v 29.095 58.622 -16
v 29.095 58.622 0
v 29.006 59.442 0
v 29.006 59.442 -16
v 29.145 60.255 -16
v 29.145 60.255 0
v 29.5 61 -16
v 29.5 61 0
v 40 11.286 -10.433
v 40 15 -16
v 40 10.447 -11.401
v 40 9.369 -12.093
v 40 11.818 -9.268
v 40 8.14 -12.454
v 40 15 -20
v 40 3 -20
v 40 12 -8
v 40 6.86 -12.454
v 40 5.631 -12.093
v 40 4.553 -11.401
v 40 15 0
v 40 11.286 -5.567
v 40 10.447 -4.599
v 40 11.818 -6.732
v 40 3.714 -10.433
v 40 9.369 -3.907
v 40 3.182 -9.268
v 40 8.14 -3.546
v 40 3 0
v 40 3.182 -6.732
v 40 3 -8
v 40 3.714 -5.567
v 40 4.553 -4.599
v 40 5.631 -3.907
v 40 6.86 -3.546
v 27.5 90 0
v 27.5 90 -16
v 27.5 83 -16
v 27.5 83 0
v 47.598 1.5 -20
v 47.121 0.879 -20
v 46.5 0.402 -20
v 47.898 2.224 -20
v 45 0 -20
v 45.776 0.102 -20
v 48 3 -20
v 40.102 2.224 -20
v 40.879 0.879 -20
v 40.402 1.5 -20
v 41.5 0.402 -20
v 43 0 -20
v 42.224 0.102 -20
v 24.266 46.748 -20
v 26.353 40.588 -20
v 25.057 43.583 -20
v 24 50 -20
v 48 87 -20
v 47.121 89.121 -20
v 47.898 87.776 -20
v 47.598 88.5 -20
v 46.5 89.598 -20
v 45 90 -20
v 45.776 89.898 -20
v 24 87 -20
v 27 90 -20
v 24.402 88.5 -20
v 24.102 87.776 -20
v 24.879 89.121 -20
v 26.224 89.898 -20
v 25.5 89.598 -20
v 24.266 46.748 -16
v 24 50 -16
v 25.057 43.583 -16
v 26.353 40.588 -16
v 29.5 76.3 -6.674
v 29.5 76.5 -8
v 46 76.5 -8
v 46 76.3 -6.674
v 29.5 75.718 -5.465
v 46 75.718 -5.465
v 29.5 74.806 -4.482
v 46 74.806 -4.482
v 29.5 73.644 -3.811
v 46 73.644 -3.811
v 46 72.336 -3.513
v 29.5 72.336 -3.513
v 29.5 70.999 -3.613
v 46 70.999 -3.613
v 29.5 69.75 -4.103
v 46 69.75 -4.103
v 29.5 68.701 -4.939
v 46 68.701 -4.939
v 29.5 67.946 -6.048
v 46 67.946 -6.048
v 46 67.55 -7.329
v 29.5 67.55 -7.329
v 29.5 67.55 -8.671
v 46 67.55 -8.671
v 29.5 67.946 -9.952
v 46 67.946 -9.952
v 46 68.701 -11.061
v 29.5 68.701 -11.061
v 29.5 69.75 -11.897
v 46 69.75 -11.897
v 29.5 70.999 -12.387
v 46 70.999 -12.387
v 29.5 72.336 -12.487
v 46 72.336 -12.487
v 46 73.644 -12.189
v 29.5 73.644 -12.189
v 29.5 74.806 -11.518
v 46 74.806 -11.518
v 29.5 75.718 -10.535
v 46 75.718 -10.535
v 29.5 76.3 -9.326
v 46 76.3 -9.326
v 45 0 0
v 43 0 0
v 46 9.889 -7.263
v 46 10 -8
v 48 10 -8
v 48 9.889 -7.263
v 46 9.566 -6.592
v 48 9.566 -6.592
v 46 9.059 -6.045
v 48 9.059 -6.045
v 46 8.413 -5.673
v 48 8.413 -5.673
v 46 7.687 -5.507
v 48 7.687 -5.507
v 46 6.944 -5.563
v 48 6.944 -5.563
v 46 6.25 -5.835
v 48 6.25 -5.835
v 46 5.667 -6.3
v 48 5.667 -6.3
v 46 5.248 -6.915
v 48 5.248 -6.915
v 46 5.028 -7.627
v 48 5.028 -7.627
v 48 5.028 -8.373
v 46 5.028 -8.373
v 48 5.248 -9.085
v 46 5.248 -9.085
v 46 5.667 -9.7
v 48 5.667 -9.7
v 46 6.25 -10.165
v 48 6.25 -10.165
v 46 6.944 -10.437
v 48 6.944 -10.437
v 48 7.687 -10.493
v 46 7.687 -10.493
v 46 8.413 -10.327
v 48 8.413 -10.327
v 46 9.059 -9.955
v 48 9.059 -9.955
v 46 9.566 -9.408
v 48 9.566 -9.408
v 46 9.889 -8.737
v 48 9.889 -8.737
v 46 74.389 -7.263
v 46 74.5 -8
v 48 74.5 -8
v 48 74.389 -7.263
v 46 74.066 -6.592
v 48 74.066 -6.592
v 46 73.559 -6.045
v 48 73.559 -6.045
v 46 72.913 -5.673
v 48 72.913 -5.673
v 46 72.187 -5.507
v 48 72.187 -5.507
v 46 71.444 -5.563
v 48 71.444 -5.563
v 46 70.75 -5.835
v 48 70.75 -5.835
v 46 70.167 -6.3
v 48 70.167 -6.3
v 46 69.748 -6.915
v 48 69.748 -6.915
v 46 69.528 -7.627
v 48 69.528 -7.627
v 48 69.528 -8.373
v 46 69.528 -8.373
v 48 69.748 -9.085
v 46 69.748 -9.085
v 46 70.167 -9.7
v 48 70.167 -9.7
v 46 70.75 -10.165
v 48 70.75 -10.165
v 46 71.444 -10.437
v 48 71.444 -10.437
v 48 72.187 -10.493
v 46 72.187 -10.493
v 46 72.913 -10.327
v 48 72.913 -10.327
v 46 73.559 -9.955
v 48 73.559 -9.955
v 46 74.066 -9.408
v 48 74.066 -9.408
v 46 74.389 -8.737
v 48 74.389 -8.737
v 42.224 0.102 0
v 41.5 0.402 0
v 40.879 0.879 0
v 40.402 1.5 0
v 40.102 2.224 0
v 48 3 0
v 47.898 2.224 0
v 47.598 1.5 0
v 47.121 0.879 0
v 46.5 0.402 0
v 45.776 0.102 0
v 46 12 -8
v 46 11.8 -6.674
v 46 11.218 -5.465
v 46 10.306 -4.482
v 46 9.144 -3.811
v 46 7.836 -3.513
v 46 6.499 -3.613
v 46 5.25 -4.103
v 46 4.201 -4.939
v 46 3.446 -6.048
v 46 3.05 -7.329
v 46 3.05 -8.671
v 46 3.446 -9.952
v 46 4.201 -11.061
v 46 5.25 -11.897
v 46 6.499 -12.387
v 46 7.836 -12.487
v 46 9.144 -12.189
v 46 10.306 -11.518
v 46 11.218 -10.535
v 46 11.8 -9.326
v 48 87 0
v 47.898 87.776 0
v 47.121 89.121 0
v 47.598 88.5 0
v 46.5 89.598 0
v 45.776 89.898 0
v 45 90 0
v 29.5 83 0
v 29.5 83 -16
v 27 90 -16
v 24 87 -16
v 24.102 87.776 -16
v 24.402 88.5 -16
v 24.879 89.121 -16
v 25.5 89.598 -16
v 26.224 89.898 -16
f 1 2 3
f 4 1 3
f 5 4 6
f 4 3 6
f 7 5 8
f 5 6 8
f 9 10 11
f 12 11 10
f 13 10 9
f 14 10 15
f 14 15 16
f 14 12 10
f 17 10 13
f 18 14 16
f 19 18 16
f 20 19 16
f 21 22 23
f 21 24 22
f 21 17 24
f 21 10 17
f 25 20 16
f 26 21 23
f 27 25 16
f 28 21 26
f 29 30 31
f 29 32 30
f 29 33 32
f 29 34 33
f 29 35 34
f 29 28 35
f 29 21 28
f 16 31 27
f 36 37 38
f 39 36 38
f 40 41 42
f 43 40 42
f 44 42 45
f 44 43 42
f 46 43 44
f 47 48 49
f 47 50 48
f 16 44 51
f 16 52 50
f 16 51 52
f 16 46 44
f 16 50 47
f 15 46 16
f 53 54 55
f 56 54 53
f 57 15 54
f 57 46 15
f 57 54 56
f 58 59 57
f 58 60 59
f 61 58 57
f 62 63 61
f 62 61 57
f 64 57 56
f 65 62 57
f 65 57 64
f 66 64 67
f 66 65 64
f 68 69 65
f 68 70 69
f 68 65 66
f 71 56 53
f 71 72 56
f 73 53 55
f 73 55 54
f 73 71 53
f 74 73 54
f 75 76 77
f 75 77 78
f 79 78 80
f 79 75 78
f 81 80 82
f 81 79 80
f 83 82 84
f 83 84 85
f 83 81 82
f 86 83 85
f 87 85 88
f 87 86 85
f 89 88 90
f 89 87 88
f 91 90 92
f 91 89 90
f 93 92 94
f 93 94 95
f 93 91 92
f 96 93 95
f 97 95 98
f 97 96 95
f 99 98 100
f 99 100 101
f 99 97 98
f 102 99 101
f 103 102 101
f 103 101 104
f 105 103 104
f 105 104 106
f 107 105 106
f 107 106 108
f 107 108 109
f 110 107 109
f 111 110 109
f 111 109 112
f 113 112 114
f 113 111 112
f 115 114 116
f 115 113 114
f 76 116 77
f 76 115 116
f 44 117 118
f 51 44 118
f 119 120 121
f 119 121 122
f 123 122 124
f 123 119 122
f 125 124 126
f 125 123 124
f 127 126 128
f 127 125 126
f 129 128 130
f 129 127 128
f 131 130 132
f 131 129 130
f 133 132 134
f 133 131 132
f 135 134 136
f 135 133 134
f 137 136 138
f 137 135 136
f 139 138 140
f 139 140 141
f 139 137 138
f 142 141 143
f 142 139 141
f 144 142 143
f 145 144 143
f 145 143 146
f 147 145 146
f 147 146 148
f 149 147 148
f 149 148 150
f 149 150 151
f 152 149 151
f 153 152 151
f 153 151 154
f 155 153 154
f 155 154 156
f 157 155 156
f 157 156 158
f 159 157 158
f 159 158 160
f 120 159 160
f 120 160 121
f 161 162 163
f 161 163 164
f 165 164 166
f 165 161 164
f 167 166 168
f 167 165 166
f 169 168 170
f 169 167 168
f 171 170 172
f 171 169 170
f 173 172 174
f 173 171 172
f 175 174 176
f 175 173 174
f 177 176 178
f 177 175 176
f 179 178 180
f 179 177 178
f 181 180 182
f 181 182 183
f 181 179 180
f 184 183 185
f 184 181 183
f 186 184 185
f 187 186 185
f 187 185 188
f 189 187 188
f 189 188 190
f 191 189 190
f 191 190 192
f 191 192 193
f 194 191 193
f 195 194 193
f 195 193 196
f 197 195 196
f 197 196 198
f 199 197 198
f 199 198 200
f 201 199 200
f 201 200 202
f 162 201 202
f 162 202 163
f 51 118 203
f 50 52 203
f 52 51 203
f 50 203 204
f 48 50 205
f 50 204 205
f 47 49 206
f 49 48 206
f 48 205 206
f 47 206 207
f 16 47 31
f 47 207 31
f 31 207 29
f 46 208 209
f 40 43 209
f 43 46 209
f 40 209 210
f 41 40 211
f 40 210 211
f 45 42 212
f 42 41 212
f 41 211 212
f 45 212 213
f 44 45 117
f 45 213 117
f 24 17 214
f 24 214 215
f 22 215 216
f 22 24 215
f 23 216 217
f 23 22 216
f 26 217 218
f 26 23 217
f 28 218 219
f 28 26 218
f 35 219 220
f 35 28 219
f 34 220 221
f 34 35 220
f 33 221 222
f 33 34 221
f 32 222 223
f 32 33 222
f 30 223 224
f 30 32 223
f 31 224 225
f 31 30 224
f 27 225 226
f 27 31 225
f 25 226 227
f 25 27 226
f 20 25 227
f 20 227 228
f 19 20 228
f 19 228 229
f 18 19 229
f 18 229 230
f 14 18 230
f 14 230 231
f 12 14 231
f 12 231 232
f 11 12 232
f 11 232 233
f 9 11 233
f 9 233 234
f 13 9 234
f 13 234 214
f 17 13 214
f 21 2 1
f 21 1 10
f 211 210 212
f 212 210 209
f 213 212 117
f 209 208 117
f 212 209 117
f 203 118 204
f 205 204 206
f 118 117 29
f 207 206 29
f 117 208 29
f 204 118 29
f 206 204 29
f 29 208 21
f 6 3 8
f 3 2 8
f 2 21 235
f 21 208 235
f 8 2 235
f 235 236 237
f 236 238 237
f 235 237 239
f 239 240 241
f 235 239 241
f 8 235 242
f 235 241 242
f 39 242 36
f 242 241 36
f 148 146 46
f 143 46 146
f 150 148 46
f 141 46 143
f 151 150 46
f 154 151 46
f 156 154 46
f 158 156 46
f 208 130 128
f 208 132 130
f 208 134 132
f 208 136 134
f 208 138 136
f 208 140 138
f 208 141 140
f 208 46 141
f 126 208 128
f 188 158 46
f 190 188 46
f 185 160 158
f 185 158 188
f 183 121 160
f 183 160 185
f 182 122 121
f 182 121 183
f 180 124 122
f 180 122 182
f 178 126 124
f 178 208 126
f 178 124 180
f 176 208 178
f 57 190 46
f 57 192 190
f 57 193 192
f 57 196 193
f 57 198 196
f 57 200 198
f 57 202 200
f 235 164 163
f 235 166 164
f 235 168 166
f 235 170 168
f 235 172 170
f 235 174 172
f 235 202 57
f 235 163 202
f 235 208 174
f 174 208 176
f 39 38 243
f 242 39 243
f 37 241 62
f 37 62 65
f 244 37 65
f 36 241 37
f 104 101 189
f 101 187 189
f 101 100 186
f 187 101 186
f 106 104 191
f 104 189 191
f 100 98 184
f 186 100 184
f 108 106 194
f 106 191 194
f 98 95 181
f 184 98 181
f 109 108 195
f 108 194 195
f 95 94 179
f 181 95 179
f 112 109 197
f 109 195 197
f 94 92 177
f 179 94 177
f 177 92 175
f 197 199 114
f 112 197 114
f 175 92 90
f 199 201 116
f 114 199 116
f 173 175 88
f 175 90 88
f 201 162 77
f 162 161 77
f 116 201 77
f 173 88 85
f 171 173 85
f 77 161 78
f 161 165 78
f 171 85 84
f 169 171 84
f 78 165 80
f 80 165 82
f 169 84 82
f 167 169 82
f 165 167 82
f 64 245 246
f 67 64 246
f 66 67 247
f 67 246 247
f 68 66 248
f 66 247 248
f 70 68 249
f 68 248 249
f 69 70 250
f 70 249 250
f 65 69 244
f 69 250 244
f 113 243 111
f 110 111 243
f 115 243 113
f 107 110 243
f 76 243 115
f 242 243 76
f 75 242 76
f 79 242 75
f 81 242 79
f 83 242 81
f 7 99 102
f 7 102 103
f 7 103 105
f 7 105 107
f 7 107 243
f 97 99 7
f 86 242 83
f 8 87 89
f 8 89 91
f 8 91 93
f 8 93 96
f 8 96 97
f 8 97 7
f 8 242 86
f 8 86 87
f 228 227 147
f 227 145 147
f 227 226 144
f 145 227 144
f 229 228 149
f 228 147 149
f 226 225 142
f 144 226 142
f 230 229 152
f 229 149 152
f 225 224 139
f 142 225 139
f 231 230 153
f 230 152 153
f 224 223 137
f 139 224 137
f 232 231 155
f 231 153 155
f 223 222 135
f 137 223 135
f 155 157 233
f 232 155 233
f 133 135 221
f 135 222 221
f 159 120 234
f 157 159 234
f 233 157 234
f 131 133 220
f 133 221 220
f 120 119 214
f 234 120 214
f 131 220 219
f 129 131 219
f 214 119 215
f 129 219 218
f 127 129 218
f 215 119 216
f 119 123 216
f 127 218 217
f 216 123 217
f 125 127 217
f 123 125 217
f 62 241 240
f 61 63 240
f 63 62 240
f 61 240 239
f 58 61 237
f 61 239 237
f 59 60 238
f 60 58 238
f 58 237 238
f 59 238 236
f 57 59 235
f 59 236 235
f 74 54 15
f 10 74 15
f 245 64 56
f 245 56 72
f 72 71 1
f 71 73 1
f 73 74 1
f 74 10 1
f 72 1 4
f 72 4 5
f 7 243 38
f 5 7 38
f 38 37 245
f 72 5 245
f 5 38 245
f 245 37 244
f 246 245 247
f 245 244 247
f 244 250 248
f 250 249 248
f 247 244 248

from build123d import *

# Parameters (mm, degrees)
SKETCH1_W            = 24
SKETCH1_H            = 90
BOSS_EXTRUDE1_DEPTH  = 20
CUT_EXTRUDE1_DEPTH   = 16
CUT_EXTRUDE8_DEPTH   = 10
SKETCH11_R           = 2.5
CUT_EXTRUDE9_DEPTH   = 18.5
SKETCH12_R           = 4.5
CUT_EXTRUDE10_DEPTH  = 16.5
FILLET1_R            = 20
FILLET2_R            = 3
FILLET1_OF_MIRROR1_R = 20
FILLET2_OF_MIRROR1_R = 3
SKETCH13_W           = 28.58864277
SKETCH13_H           = 106.823904202
CUT_EXTRUDE11_DEPTH  = 24


with BuildPart() as part:
    # Sketch1 → Boss-Extrude1 (new body)
    with BuildSketch(Plane.XY):
        with Locations((12, 45)):
            Rectangle(SKETCH1_W, SKETCH1_H)
    boss_extrude1 = extrude(amount=-BOSS_EXTRUDE1_DEPTH)

    # Sketch4 → Cut-Extrude1 (cut)
    with BuildSketch(Plane.XY):
        Polygon((20.5, 83), (18.5, 83), (18.5, 61), (19.5, 61), (8, 15), (8, 0), (24, 0), (24, 90), (20.5, 90), align=None)
    cut_extrude1 = extrude(amount=-CUT_EXTRUDE1_DEPTH, mode=Mode.SUBTRACT)

    # Sketch9 → Cut-Extrude8 (cut)
    with BuildSketch(Plane(origin=(0, 0, -20), x_dir=(-1, 0, 0), z_dir=(0, 0, -1))):
        Polygon((-24, 0), (-24, 45), (-8, 15), (-8, 0), align=None)
    cut_extrude8 = extrude(amount=-CUT_EXTRUDE8_DEPTH, mode=Mode.SUBTRACT)

    # Sketch11 → Cut-Extrude9 (cut)
    with BuildSketch(Plane(origin=(18.5, 0, 0), x_dir=(0, 0, -1), z_dir=(1, 0, 0))):
        with Locations(Location((8, 72, 0), (0, 0, 90))):
            Circle(SKETCH11_R)
        with Locations(Location((8, 7.5, 0), (0, 0, 90))):
            Circle(SKETCH11_R)
    cut_extrude9 = extrude(amount=-CUT_EXTRUDE9_DEPTH, mode=Mode.SUBTRACT)

    # Sketch12 → Cut-Extrude10 (cut)
    with BuildSketch(Plane(origin=(18.5, 0, 0), x_dir=(0, 0, -1), z_dir=(1, 0, 0))):
        with Locations(Location((8, 72, 0), (0, 0, 90))):
            Circle(SKETCH12_R)
        with Locations(Location((8, 7.5, 0), (0, 0, 90))):
            Circle(SKETCH12_R)
    cut_extrude10 = extrude(amount=-CUT_EXTRUDE10_DEPTH, mode=Mode.SUBTRACT)

    # Fillet1
    fillet1_edges = [part.edges().sort_by_distance(p)[0] for p in [
        (24, 45, -18),
    ]]
    fillet(fillet1_edges, radius=FILLET1_R)

    # Fillet2
    # the kernel refuses this fillet: 3 mm, written as the material it takes off along each edge
    with BuildSketch(Plane(origin=(0, 90, 7.5), x_dir=(1, 0, 0), z_dir=(0, 0, -1)), Plane(origin=(0, 0, 7.5), x_dir=(0, 1, 0), z_dir=(0, 0, -1)), Plane(origin=(8, 0, -27.5), x_dir=(0, 1, 0), z_dir=(0, 0, 1))) as fillet2_piece_1:
        with BuildLine():
            CenterArc((FILLET2_R, FILLET2_R), FILLET2_R, 180, 90)
            Line((0, FILLET2_R), (-FILLET2_R * 0.02, FILLET2_R))
            Line((-FILLET2_R * 0.02, FILLET2_R), (-FILLET2_R * 0.02, -FILLET2_R * 0.02))
            Line((-FILLET2_R * 0.02, -FILLET2_R * 0.02), (FILLET2_R, -FILLET2_R * 0.02))
            Line((FILLET2_R, -FILLET2_R * 0.02), (FILLET2_R, 0))
        make_face()
    extrude(amount=35, mode=Mode.SUBTRACT)
    with BuildSketch(Plane(origin=(24, 90, -8.5), x_dir=(0, -1, 0), z_dir=(0, 0, -1))) as fillet2_piece_2:
        with BuildLine():
            CenterArc((FILLET2_R, FILLET2_R), FILLET2_R, 180, 90)
            Line((0, FILLET2_R), (-FILLET2_R * 0.02, FILLET2_R))
            Line((-FILLET2_R * 0.02, FILLET2_R), (-FILLET2_R * 0.02, -FILLET2_R * 0.02))
            Line((-FILLET2_R * 0.02, -FILLET2_R * 0.02), (FILLET2_R, -FILLET2_R * 0.02))
            Line((FILLET2_R, -FILLET2_R * 0.02), (FILLET2_R, 0))
        make_face()
    extrude(amount=19, mode=Mode.SUBTRACT)
    with BuildSketch(Plane(origin=(19.5, 61, 6.128837665), x_dir=(-0.24253562503633366, -0.9701425001453317, 0), z_dir=(0, 0, -1))) as fillet2_piece_3:
        with BuildLine():
            CenterArc((2.451535066, 3), FILLET2_R, 222.580014358, 47.419985642)
            Line((0.242535625, 0.9701425), (0.198355636, 0.92954535))
            ThreePointArc((0.198355636, 0.92954535), (0.063059263, 0.499623388), (-0.05820855, 0.014552138))
            Line((-0.05820855, 0.014552138), (0, -0.06))
            Line((0, -0.06), (2.451535066, -0.06))
            Line((2.451535066, -0.06), (2.451535066, 0))
        make_face()
    extrude(amount=22.128837665, mode=Mode.SUBTRACT)


with BuildPart() as mirror1_1:
    # Mirror1: Boss-Extrude1 across plane
    add(boss_extrude1.mirror(Plane(origin=(24, 0, -20), x_dir=(0, 0, 1), z_dir=(1, 0, 0))))

    # Mirror1 2: Cut-Extrude1, Cut-Extrude8, Cut-Extrude9, Cut-Extrude10 across plane
    add(cut_extrude1.mirror(Plane(origin=(24, 0, -20), x_dir=(0, 0, 1), z_dir=(1, 0, 0))), mode=Mode.SUBTRACT)
    add(cut_extrude8.mirror(Plane(origin=(24, 0, -20), x_dir=(0, 0, 1), z_dir=(1, 0, 0))), mode=Mode.SUBTRACT)
    add(cut_extrude9.mirror(Plane(origin=(24, 0, -20), x_dir=(0, 0, 1), z_dir=(1, 0, 0))), mode=Mode.SUBTRACT)
    add(cut_extrude10.mirror(Plane(origin=(24, 0, -20), x_dir=(0, 0, 1), z_dir=(1, 0, 0))), mode=Mode.SUBTRACT)

    # Fillet1 of Mirror1
    fillet1_of_mirror1_edges = [mirror1_1.edges().sort_by_distance(p)[0] for p in [
        (24, 45, -18),
    ]]
    fillet(fillet1_of_mirror1_edges, radius=FILLET1_OF_MIRROR1_R)

    # Fillet2 of Mirror1
    # the kernel refuses this fillet: 3 mm, written as the material it takes off along each edge
    with BuildSketch(Plane(origin=(48, 90, 7.5), x_dir=(-1, 0, 0), z_dir=(0, 0, -1)), Plane(origin=(48, 0, 7.5), x_dir=(0, 1, 0), z_dir=(0, 0, -1))) as fillet2_of_mirror1_piece_1:
        with BuildLine():
            CenterArc((FILLET2_OF_MIRROR1_R, -FILLET2_OF_MIRROR1_R), FILLET2_OF_MIRROR1_R, 90, 90)
            Line((0, -FILLET2_OF_MIRROR1_R), (-FILLET2_OF_MIRROR1_R * 0.02, -FILLET2_OF_MIRROR1_R))
            Line((-FILLET2_OF_MIRROR1_R * 0.02, -FILLET2_OF_MIRROR1_R), (-FILLET2_OF_MIRROR1_R * 0.02, FILLET2_OF_MIRROR1_R * 0.02))
            Line((-FILLET2_OF_MIRROR1_R * 0.02, FILLET2_OF_MIRROR1_R * 0.02), (FILLET2_OF_MIRROR1_R, FILLET2_OF_MIRROR1_R * 0.02))
            Line((FILLET2_OF_MIRROR1_R, FILLET2_OF_MIRROR1_R * 0.02), (FILLET2_OF_MIRROR1_R, 0))
        make_face()
    extrude(amount=35, mode=Mode.SUBTRACT)
    with BuildSketch(Plane(origin=(24, 90, -8.5), x_dir=(0, -1, 0), z_dir=(0, 0, -1))) as fillet2_of_mirror1_piece_2:
        with BuildLine():
            CenterArc((FILLET2_OF_MIRROR1_R, -FILLET2_OF_MIRROR1_R), FILLET2_OF_MIRROR1_R, 90, 90)
            Line((0, -FILLET2_OF_MIRROR1_R), (-FILLET2_OF_MIRROR1_R * 0.02, -FILLET2_OF_MIRROR1_R))
            Line((-FILLET2_OF_MIRROR1_R * 0.02, -FILLET2_OF_MIRROR1_R), (-FILLET2_OF_MIRROR1_R * 0.02, FILLET2_OF_MIRROR1_R * 0.02))
            Line((-FILLET2_OF_MIRROR1_R * 0.02, FILLET2_OF_MIRROR1_R * 0.02), (FILLET2_OF_MIRROR1_R, FILLET2_OF_MIRROR1_R * 0.02))
            Line((FILLET2_OF_MIRROR1_R, FILLET2_OF_MIRROR1_R * 0.02), (FILLET2_OF_MIRROR1_R, 0))
        make_face()
    extrude(amount=19, mode=Mode.SUBTRACT)
    with BuildSketch(Plane(origin=(40, 0, 7.5), x_dir=(0, 1, 0), z_dir=(0, 0, -1))) as fillet2_of_mirror1_piece_3:
        with BuildLine():
            CenterArc((FILLET2_OF_MIRROR1_R, FILLET2_OF_MIRROR1_R), FILLET2_OF_MIRROR1_R, 180, 90)
            Line((0, FILLET2_OF_MIRROR1_R), (-FILLET2_OF_MIRROR1_R * 0.02, FILLET2_OF_MIRROR1_R))
            Line((-FILLET2_OF_MIRROR1_R * 0.02, FILLET2_OF_MIRROR1_R), (-FILLET2_OF_MIRROR1_R * 0.02, -FILLET2_OF_MIRROR1_R * 0.02))
            Line((-FILLET2_OF_MIRROR1_R * 0.02, -FILLET2_OF_MIRROR1_R * 0.02), (FILLET2_OF_MIRROR1_R, -FILLET2_OF_MIRROR1_R * 0.02))
            Line((FILLET2_OF_MIRROR1_R, -FILLET2_OF_MIRROR1_R * 0.02), (FILLET2_OF_MIRROR1_R, 0))
        make_face()
    extrude(amount=35, mode=Mode.SUBTRACT)
    with BuildSketch(Plane(origin=(28.5, 61, 6.128837665), x_dir=(0.24253562503633366, -0.9701425001453317, 0), z_dir=(0, 0, -1))) as fillet2_of_mirror1_piece_4:
        with BuildLine():
            CenterArc((2.451535066, -3), FILLET2_OF_MIRROR1_R, 90, 47.419985642)
            Line((0.242535625, -0.9701425), (0.198355636, -0.92954535))
            ThreePointArc((0.198355636, -0.92954535), (0.063059263, -0.499623388), (-0.05820855, -0.014552138))
            Line((-0.05820855, -0.014552138), (0, 0.06))
            Line((0, 0.06), (2.451535066, 0.06))
            Line((2.451535066, 0.06), (2.451535066, 0))
        make_face()
    extrude(amount=22.128837665, mode=Mode.SUBTRACT)


with BuildPart() as part_1:
    add(part.part)

    # Mirror1 united with what the copies touc: union Mirror1_1
    add(mirror1_1.part)

    # Sketch13 → Cut-Extrude11 (cut)
    with BuildSketch(Plane.ZY):
        with Locations((-8.954074045, 49.790814809)):
            Rectangle(SKETCH13_W, SKETCH13_H)
    extrude(amount=-CUT_EXTRUDE11_DEPTH, mode=Mode.SUBTRACT)


solid = part_1.part
